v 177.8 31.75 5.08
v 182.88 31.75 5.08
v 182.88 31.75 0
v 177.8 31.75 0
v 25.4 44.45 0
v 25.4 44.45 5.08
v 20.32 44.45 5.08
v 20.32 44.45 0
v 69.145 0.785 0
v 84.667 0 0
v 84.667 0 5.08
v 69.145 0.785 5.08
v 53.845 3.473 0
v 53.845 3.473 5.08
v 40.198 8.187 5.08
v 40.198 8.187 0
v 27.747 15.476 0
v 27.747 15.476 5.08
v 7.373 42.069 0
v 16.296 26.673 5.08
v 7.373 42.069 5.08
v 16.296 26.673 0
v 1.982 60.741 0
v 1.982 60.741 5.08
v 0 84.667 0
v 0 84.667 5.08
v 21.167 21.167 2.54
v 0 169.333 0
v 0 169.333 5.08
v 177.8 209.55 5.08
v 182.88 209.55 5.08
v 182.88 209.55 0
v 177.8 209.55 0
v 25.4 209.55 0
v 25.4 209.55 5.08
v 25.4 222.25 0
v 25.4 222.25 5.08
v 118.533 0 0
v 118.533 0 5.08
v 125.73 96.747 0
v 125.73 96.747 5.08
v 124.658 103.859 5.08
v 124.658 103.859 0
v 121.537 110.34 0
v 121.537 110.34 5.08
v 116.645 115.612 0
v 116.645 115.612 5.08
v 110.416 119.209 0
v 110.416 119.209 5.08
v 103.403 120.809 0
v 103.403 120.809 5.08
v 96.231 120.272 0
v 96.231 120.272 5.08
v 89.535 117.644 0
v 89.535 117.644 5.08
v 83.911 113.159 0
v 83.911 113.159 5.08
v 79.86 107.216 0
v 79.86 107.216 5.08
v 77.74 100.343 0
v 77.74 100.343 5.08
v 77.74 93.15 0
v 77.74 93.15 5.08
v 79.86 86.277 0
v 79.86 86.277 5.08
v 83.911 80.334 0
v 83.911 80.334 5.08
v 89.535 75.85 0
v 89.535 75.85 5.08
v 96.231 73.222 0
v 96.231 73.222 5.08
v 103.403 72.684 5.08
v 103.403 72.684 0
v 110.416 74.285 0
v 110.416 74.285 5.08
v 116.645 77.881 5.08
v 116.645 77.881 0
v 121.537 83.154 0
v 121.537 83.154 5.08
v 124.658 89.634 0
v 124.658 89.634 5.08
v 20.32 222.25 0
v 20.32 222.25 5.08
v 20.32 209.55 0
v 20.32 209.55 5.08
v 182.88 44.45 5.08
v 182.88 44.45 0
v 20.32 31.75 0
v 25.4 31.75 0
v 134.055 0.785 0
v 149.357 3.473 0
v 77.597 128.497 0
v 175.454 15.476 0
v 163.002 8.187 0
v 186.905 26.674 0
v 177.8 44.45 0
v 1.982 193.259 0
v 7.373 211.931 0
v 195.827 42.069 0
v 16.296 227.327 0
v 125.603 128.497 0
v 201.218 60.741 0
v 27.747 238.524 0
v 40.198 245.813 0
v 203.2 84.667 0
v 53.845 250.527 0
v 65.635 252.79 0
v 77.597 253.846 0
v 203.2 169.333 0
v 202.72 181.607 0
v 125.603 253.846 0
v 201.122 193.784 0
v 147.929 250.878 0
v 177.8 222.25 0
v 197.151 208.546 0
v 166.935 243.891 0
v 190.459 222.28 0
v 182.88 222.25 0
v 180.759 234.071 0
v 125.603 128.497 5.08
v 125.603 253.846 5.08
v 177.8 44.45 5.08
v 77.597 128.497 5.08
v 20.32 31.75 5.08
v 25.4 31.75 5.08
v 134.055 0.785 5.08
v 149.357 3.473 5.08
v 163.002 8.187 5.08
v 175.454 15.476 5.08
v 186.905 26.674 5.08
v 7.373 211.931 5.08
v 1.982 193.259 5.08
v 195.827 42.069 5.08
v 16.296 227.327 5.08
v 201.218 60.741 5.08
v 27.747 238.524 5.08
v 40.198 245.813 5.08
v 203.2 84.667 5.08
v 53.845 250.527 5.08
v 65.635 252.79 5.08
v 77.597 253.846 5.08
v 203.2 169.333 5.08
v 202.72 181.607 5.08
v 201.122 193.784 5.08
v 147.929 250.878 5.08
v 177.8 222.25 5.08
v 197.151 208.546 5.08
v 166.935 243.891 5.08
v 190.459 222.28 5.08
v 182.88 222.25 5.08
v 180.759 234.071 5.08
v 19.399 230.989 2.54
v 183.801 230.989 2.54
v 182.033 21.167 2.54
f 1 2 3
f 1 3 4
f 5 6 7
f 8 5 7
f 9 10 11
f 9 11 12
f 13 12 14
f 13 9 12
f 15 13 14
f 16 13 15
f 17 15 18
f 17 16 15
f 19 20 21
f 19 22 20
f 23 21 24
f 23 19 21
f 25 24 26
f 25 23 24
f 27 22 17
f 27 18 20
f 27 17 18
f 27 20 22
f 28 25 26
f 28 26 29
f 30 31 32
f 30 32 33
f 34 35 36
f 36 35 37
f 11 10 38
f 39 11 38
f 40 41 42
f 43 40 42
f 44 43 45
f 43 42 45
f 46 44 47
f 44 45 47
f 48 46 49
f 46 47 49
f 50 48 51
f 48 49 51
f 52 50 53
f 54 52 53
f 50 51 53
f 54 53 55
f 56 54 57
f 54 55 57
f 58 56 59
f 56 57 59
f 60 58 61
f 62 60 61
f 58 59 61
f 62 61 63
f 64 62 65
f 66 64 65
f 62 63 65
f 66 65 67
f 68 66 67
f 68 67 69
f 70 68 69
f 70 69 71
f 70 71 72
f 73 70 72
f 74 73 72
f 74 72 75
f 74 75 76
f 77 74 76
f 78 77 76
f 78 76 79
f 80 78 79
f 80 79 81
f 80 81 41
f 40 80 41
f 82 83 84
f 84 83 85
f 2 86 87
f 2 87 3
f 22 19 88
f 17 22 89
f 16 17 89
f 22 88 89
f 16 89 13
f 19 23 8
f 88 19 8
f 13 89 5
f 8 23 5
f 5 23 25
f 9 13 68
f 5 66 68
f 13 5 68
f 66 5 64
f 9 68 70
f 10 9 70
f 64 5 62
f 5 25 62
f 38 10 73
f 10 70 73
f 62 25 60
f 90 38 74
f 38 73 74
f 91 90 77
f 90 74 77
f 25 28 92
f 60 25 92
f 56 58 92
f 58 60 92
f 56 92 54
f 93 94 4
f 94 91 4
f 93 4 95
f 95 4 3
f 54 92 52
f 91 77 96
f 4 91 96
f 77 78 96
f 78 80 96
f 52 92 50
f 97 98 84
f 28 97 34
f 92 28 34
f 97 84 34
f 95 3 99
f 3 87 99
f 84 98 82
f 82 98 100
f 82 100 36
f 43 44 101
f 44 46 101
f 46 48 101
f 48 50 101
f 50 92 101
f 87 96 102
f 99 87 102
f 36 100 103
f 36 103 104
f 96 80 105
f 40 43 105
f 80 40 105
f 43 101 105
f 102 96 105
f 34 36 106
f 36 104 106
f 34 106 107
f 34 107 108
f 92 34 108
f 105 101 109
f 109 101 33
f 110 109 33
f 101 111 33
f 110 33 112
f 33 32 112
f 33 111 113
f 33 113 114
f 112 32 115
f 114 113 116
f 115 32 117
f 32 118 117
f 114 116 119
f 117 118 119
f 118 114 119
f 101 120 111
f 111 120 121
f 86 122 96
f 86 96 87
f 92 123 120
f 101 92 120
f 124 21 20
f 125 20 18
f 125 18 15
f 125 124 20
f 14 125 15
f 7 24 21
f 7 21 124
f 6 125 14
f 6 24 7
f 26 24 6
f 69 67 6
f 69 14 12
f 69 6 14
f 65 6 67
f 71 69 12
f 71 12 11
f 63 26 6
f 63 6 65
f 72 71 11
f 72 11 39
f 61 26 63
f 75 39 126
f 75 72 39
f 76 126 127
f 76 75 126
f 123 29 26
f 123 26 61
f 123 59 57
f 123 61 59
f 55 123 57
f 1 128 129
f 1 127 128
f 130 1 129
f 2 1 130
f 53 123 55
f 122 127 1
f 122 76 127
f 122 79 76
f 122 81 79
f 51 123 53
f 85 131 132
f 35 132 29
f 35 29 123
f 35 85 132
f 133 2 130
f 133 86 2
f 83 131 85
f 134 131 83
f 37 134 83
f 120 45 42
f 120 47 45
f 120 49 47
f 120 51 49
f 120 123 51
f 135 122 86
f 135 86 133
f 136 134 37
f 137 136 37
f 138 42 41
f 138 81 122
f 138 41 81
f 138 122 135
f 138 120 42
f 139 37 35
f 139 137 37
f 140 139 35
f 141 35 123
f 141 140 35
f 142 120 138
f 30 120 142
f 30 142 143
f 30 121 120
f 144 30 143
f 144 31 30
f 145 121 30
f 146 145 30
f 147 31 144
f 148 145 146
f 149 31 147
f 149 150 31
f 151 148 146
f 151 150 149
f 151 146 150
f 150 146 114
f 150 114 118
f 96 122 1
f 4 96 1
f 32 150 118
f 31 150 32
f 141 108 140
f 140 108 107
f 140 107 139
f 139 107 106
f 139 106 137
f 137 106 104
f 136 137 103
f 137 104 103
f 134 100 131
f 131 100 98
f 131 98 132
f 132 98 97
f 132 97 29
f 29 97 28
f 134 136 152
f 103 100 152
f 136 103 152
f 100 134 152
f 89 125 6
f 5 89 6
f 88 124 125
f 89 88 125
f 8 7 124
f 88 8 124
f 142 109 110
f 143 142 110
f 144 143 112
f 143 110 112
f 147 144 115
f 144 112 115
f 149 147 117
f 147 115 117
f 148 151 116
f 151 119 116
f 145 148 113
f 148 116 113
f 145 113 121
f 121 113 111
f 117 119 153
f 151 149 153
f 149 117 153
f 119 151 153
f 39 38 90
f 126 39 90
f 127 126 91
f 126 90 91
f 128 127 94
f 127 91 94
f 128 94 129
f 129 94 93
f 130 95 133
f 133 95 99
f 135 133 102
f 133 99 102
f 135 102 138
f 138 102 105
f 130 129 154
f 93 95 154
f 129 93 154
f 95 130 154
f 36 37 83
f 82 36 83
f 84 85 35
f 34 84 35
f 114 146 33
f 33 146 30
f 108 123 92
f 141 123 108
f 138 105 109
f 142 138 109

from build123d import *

# Parameters (mm, degrees)
SKETCH1_W           = 203.2
SKETCH1_H           = 254
BOSS_EXTRUDE1_DEPTH = 5.08
FILLET1_SIZE        = 84.666666667
SKETCH2_R           = 24.13
CUT_EXTRUDE1_DEPTH  = 326.318377121
SKETCH8_W           = 48.006
SKETCH8_H           = 125.503270334
CUT_EXTRUDE6_DEPTH  = 326.318377121
CUT_EXTRUDE7_DEPTH  = 326.198087964


with BuildPart() as part:
    # Sketch1 → Boss-Extrude1 (new body)
    with BuildSketch(Plane.XY):
        with Locations((101.6, 127)):
            Rectangle(SKETCH1_W, SKETCH1_H)
    extrude(amount=BOSS_EXTRUDE1_DEPTH)

    # Fillet1
    # a fillet whose section is not a circle: 84.666666667 mm, written as the material it takes off along each edge
    with BuildSketch(Plane(origin=(203.2, 254, -211.666666667), x_dir=(0, -1, 0), z_dir=(0, 0, 1)), Plane(origin=(0, 254, -211.666666667), x_dir=(1, 0, 0), z_dir=(0, 0, 1)), Plane(origin=(203.2, 0, -211.666666667), x_dir=(-1, 0, 0), z_dir=(0, 0, 1))) as fillet1_piece_1:
        with BuildLine():
            Bezier((FILLET1_SIZE, 0), (0, 0), (0, -FILLET1_SIZE), weights=[1, 1, 1])
            Line((0, -FILLET1_SIZE), (0, 0))
            Line((0, 0), (FILLET1_SIZE, 0))
        make_face()
    extrude(amount=428.413333333, mode=Mode.SUBTRACT)
    with BuildSketch(Plane(origin=(0, 0, -211.666666667), x_dir=(1, 0, 0), z_dir=(0, 0, 1))) as fillet1_piece_2:
        with BuildLine():
            Bezier((FILLET1_SIZE, 0), (0, 0), (0, FILLET1_SIZE), weights=[1, 1, 1])
            Line((0, FILLET1_SIZE), (0, 0))
            Line((0, 0), (FILLET1_SIZE, 0))
        make_face()
    extrude(amount=428.413333333, mode=Mode.SUBTRACT)

    # Sketch2 → Cut-Extrude1 (cut, through all)
    with BuildSketch(Plane.XY.offset(5.08)):
        with Locations((101.6, 96.746729666)):
            Circle(SKETCH2_R)
    extrude(amount=-CUT_EXTRUDE1_DEPTH, mode=Mode.SUBTRACT)

    # Sketch8 → Cut-Extrude6 (cut, through all)
    with BuildSketch(Plane.XY.offset(5.08)):
        with Locations((101.6, 191.248364833)):
            Rectangle(SKETCH8_W, SKETCH8_H)
    extrude(amount=-CUT_EXTRUDE6_DEPTH, mode=Mode.SUBTRACT)

    # Sketch7 → Cut-Extrude7 (cut, through all)
    with BuildSketch(Plane.XY.offset(5.08)):
        Polygon((25.4, 215.9), (25.4, 222.25), (20.32, 222.25), (20.32, 209.55), (25.4, 209.55), align=None)
        Polygon((177.8, 215.9), (177.8, 222.25), (182.88, 222.25), (182.88, 209.55), (177.8, 209.55), align=None)
        Polygon((177.8, 38.1), (177.8, 44.45), (182.88, 44.45), (182.88, 31.75), (177.8, 31.75), align=None)
        Polygon((25.4, 38.1), (25.4, 44.45), (20.32, 44.45), (20.32, 31.75), (25.4, 31.75), align=None)
    extrude(amount=-CUT_EXTRUDE7_DEPTH, mode=Mode.SUBTRACT)


solid = part.part
